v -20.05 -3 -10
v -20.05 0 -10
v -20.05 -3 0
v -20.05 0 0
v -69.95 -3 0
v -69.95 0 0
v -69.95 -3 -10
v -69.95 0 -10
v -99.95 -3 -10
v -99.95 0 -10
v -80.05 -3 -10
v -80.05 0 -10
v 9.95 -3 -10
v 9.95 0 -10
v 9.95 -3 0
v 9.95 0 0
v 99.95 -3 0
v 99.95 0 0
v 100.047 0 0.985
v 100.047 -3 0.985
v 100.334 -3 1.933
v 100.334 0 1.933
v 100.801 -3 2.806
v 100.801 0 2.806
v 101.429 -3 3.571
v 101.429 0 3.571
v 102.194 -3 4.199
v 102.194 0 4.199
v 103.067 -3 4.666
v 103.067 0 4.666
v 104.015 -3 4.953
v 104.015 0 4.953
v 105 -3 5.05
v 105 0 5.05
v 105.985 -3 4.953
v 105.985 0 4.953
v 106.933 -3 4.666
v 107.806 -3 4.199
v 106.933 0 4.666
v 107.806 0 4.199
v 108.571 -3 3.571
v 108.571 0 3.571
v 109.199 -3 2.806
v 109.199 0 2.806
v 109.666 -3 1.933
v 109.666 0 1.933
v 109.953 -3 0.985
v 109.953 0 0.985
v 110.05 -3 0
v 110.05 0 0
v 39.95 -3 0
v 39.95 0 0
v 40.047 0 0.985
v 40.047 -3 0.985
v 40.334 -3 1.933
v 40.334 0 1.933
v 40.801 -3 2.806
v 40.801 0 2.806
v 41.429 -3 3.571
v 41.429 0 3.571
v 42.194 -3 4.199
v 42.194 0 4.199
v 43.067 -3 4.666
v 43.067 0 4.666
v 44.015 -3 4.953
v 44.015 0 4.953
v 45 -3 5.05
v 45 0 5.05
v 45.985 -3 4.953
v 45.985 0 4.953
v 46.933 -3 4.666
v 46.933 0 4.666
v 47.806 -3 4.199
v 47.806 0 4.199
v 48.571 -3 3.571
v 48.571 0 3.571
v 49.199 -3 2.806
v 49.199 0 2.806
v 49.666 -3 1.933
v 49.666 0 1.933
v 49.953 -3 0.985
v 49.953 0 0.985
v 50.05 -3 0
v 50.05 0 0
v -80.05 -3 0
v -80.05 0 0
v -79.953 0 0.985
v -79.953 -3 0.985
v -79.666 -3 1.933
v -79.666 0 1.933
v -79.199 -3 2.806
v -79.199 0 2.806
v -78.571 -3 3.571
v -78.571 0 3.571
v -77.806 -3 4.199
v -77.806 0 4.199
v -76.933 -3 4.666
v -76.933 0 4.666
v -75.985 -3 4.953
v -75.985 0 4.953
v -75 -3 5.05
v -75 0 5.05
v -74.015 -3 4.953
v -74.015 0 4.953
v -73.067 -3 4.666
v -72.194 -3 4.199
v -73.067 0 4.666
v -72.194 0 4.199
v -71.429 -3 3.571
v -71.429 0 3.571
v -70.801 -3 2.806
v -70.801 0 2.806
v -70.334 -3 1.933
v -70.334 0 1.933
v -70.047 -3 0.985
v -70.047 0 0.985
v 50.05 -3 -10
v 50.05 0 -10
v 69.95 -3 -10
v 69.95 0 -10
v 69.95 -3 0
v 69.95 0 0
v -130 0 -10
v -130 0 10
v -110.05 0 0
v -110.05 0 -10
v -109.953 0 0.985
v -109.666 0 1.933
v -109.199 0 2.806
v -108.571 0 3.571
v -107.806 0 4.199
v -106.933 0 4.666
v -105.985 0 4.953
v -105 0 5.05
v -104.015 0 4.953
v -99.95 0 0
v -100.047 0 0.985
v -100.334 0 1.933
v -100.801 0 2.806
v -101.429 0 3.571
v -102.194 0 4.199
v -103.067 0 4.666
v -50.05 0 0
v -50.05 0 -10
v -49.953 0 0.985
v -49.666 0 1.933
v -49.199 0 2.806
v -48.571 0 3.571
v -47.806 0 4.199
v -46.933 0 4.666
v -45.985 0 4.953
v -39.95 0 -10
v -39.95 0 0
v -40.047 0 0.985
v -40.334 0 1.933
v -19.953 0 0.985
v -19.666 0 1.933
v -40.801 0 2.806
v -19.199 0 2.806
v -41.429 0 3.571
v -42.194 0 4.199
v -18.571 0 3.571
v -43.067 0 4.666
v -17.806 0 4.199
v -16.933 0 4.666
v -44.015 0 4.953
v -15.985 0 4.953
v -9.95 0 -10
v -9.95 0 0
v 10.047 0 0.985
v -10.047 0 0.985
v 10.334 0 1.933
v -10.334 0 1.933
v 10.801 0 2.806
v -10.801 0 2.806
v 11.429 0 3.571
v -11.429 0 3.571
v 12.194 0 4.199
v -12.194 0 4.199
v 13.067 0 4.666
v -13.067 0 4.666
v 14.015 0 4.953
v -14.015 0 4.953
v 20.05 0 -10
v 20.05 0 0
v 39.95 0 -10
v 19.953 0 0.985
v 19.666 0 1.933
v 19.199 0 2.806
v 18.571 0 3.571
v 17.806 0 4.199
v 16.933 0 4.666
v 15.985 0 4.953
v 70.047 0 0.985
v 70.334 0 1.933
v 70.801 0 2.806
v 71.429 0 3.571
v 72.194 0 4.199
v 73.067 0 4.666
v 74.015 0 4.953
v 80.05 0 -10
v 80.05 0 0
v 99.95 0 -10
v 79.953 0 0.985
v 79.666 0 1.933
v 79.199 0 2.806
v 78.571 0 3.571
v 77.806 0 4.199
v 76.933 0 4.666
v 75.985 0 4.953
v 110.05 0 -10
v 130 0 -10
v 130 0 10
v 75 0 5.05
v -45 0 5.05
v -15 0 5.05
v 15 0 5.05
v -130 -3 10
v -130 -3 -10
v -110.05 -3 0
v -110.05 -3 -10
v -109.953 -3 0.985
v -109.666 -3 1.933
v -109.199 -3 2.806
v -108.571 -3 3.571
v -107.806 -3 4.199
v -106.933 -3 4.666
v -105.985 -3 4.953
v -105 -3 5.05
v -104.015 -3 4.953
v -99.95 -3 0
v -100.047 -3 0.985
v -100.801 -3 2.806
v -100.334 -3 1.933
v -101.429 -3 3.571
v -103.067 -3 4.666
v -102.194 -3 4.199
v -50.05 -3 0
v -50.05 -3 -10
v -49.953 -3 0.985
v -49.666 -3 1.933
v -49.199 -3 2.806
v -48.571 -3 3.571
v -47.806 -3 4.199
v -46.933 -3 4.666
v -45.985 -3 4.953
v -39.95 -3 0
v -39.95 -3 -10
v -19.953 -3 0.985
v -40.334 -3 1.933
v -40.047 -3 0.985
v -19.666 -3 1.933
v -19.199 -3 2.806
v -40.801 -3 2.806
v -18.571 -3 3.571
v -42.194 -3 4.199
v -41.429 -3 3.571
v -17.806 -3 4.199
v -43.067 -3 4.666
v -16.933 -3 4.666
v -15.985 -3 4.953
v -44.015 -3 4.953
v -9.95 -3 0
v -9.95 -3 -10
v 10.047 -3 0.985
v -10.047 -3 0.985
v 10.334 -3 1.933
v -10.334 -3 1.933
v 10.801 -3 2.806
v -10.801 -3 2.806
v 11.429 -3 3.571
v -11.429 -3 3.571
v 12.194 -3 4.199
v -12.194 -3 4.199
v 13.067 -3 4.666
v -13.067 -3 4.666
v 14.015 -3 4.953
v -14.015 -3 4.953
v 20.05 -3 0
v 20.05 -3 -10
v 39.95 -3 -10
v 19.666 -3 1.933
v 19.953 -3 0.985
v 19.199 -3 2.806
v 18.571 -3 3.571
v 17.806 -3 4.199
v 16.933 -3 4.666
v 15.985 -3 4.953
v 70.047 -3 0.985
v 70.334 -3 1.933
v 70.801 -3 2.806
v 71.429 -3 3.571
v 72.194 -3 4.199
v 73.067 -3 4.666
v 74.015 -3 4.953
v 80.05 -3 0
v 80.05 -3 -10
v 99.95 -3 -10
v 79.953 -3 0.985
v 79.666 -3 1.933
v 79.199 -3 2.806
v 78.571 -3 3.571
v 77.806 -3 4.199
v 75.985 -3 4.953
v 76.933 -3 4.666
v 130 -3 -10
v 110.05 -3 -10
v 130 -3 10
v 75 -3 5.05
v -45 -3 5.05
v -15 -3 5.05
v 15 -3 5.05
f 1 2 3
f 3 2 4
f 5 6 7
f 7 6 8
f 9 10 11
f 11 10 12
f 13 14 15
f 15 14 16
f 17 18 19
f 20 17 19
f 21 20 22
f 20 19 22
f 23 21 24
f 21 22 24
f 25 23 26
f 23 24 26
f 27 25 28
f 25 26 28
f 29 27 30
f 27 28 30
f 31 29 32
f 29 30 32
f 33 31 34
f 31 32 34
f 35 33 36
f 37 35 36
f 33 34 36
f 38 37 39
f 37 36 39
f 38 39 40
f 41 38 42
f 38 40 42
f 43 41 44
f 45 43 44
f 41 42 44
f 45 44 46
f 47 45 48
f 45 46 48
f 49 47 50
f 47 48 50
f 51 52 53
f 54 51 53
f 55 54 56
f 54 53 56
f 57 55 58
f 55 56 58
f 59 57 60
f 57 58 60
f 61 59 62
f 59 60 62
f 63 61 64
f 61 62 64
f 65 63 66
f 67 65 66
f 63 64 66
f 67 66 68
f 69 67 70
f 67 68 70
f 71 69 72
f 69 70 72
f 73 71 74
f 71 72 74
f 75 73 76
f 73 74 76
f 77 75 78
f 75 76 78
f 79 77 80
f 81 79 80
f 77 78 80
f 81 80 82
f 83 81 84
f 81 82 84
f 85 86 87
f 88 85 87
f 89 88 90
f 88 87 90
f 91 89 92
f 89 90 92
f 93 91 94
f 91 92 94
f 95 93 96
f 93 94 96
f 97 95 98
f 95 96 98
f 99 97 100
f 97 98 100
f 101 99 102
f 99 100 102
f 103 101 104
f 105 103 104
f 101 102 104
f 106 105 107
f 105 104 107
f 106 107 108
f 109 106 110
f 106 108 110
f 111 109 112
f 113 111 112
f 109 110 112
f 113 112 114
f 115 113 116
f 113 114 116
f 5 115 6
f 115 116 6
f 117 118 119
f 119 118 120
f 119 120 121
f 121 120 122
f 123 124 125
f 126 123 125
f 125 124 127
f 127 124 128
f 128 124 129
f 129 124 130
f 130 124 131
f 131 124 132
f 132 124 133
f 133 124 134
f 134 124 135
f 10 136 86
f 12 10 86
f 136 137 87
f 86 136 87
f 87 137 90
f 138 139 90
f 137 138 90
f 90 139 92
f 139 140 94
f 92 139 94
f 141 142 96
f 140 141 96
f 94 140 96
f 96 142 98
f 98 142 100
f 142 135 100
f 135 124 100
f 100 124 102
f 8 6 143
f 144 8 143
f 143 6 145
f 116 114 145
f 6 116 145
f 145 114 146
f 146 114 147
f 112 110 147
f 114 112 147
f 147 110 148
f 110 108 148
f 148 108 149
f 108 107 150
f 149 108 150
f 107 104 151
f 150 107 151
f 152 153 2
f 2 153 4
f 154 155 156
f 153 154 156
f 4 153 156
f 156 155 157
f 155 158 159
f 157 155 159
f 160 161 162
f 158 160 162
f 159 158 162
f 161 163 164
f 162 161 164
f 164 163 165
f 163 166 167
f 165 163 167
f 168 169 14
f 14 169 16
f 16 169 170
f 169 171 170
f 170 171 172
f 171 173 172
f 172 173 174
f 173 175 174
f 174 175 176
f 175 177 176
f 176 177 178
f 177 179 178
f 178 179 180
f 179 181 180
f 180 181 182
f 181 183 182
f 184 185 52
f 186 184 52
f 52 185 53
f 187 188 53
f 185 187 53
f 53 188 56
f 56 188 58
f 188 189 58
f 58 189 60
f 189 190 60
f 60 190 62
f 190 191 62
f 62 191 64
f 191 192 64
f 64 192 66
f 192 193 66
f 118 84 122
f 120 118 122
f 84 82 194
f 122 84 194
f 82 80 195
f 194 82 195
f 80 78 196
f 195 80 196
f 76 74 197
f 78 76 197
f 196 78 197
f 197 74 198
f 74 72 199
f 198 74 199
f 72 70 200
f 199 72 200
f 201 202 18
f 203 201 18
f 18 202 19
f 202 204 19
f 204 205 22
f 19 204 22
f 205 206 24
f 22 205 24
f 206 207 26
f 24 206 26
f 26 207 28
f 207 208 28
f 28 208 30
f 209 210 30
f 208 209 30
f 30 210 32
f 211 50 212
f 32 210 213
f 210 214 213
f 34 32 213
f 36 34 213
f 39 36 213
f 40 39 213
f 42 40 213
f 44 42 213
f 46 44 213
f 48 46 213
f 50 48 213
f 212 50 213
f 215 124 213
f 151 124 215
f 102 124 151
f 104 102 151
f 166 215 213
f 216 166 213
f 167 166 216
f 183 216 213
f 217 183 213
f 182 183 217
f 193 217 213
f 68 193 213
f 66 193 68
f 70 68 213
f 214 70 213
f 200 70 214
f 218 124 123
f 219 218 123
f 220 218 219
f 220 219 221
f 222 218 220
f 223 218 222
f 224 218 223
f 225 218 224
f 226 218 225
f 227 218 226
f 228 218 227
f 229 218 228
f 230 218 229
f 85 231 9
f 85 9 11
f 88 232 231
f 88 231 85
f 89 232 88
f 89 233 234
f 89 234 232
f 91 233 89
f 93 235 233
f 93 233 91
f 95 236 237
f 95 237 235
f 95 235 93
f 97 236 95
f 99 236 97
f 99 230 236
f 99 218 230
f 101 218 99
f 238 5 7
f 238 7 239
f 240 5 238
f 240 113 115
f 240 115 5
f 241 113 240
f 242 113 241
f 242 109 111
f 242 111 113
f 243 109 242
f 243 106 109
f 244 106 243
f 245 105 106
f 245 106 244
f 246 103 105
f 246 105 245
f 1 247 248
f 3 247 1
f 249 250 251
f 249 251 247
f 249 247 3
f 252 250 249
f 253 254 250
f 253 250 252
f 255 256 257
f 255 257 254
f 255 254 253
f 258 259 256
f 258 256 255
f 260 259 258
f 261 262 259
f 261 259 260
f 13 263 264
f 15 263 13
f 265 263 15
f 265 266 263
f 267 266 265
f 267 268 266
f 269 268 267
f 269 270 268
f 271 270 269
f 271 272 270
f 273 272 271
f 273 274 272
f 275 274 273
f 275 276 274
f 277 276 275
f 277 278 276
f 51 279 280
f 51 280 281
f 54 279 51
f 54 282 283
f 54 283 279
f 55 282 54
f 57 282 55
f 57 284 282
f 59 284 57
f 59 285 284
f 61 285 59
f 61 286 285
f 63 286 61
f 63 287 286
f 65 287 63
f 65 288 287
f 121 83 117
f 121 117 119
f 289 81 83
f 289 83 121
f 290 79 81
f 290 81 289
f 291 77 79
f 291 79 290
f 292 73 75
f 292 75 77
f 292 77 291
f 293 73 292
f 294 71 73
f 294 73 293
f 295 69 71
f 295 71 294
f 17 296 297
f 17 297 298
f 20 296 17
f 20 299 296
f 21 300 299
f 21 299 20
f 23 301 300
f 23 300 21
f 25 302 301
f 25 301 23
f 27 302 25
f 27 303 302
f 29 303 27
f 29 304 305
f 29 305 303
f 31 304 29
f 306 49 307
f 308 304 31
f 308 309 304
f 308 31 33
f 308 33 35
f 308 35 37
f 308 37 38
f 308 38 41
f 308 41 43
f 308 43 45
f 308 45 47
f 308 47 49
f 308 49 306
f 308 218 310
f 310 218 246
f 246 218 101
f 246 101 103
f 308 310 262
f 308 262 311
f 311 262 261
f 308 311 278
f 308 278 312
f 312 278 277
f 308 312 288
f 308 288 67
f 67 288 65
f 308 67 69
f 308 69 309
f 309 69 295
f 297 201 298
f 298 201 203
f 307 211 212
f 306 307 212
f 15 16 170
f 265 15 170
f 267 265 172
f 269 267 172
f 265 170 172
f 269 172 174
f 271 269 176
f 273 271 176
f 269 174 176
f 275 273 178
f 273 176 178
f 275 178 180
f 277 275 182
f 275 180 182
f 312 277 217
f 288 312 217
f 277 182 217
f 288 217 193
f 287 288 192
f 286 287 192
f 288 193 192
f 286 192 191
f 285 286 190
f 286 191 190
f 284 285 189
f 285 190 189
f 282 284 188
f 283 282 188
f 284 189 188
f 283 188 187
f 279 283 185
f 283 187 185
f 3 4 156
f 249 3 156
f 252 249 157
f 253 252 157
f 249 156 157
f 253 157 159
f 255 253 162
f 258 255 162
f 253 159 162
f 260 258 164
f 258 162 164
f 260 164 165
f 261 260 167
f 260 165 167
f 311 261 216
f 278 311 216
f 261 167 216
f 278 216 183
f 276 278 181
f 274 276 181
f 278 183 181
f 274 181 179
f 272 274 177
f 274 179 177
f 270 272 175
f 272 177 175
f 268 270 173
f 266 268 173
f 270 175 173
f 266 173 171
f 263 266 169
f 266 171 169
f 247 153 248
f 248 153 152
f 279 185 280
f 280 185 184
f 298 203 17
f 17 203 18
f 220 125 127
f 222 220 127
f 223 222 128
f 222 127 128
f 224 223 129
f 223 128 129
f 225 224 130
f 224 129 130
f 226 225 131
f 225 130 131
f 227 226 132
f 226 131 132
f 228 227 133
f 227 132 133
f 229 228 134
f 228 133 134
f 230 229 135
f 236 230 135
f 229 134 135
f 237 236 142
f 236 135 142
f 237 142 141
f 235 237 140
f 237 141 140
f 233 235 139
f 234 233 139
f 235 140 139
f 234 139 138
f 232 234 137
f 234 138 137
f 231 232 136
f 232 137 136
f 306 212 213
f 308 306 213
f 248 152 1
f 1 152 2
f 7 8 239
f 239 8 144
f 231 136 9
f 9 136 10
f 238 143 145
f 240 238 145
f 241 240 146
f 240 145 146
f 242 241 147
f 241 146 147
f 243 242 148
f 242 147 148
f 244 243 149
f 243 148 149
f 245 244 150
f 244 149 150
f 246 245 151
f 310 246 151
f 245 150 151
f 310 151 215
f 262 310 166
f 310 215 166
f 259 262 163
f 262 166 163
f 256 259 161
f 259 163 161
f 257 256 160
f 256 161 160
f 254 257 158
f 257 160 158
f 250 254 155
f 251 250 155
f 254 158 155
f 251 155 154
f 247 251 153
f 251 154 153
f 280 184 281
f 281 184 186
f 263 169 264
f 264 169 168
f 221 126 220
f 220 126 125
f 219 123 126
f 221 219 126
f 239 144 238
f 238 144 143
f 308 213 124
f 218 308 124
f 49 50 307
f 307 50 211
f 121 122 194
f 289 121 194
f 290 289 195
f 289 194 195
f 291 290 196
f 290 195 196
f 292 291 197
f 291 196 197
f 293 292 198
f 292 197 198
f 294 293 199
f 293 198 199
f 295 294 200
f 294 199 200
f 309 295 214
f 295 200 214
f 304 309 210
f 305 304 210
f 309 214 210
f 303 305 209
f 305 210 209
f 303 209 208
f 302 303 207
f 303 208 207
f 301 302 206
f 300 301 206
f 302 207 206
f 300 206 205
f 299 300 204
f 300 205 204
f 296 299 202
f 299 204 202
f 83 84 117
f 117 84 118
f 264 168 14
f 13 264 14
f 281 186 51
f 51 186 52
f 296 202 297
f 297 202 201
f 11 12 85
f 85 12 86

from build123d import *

# Parameters (mm, degrees)
F1_DEPTH = 3


with BuildPart() as f1:
    # F0 (on Front) → F1 (new body)
    with BuildSketch(Plane.XZ):
        with BuildLine():
            Line((130, -10), (130, 10))
            Line((130, 10), (-130, 10))
            Line((-130, 10), (-130, -10))
            Line((-130, -10), (-110.05, -10))
            Line((-110.05, -10), (-110.05, 0))
            ThreePointArc((-110.05, 0), (-105, 5.05), (-99.95, 0))
            Line((-99.95, 0), (-99.95, -10))
            Line((-99.95, -10), (-80.05, -10))
            Line((-80.05, -10), (-80.05, 0))
            ThreePointArc((-80.05, 0), (-75, 5.05), (-69.95, 0))
            Line((-69.95, 0), (-69.95, -10))
            Line((-69.95, -10), (-50.05, -10))
            Line((-50.05, -10), (-50.05, 0))
            ThreePointArc((-50.05, 0), (-45, 5.05), (-39.95, 0))
            Line((-39.95, 0), (-39.95, -10))
            Line((-39.95, -10), (-20.05, -10))
            Line((-20.05, -10), (-20.05, 0))
            ThreePointArc((-20.05, 0), (-15, 5.05), (-9.95, 0))
            Line((-9.95, 0), (-9.95, -10))
            Line((-9.95, -10), (9.95, -10))
            Line((9.95, -10), (9.95, 0))
            ThreePointArc((9.95, 0), (15, 5.05), (20.05, 0))
            Line((20.05, 0), (20.05, -10))
            Line((20.05, -10), (39.95, -10))
            Line((39.95, -10), (39.95, 0))
            ThreePointArc((39.95, 0), (45, 5.05), (50.05, 0))
            Line((50.05, 0), (50.05, -10))
            Line((50.05, -10), (69.95, -10))
            Line((69.95, -10), (69.95, 0))
            ThreePointArc((69.95, 0), (75, 5.05), (80.05, 0))
            Line((80.05, 0), (80.05, -10))
            Line((80.05, -10), (99.95, -10))
            Line((99.95, -10), (99.95, 0))
            ThreePointArc((99.95, 0), (105, 5.05), (110.05, 0))
            Line((110.05, 0), (110.05, -10))
            Line((110.05, -10), (130, -10))
        make_face()
    extrude(amount=F1_DEPTH)


solid = f1.part
